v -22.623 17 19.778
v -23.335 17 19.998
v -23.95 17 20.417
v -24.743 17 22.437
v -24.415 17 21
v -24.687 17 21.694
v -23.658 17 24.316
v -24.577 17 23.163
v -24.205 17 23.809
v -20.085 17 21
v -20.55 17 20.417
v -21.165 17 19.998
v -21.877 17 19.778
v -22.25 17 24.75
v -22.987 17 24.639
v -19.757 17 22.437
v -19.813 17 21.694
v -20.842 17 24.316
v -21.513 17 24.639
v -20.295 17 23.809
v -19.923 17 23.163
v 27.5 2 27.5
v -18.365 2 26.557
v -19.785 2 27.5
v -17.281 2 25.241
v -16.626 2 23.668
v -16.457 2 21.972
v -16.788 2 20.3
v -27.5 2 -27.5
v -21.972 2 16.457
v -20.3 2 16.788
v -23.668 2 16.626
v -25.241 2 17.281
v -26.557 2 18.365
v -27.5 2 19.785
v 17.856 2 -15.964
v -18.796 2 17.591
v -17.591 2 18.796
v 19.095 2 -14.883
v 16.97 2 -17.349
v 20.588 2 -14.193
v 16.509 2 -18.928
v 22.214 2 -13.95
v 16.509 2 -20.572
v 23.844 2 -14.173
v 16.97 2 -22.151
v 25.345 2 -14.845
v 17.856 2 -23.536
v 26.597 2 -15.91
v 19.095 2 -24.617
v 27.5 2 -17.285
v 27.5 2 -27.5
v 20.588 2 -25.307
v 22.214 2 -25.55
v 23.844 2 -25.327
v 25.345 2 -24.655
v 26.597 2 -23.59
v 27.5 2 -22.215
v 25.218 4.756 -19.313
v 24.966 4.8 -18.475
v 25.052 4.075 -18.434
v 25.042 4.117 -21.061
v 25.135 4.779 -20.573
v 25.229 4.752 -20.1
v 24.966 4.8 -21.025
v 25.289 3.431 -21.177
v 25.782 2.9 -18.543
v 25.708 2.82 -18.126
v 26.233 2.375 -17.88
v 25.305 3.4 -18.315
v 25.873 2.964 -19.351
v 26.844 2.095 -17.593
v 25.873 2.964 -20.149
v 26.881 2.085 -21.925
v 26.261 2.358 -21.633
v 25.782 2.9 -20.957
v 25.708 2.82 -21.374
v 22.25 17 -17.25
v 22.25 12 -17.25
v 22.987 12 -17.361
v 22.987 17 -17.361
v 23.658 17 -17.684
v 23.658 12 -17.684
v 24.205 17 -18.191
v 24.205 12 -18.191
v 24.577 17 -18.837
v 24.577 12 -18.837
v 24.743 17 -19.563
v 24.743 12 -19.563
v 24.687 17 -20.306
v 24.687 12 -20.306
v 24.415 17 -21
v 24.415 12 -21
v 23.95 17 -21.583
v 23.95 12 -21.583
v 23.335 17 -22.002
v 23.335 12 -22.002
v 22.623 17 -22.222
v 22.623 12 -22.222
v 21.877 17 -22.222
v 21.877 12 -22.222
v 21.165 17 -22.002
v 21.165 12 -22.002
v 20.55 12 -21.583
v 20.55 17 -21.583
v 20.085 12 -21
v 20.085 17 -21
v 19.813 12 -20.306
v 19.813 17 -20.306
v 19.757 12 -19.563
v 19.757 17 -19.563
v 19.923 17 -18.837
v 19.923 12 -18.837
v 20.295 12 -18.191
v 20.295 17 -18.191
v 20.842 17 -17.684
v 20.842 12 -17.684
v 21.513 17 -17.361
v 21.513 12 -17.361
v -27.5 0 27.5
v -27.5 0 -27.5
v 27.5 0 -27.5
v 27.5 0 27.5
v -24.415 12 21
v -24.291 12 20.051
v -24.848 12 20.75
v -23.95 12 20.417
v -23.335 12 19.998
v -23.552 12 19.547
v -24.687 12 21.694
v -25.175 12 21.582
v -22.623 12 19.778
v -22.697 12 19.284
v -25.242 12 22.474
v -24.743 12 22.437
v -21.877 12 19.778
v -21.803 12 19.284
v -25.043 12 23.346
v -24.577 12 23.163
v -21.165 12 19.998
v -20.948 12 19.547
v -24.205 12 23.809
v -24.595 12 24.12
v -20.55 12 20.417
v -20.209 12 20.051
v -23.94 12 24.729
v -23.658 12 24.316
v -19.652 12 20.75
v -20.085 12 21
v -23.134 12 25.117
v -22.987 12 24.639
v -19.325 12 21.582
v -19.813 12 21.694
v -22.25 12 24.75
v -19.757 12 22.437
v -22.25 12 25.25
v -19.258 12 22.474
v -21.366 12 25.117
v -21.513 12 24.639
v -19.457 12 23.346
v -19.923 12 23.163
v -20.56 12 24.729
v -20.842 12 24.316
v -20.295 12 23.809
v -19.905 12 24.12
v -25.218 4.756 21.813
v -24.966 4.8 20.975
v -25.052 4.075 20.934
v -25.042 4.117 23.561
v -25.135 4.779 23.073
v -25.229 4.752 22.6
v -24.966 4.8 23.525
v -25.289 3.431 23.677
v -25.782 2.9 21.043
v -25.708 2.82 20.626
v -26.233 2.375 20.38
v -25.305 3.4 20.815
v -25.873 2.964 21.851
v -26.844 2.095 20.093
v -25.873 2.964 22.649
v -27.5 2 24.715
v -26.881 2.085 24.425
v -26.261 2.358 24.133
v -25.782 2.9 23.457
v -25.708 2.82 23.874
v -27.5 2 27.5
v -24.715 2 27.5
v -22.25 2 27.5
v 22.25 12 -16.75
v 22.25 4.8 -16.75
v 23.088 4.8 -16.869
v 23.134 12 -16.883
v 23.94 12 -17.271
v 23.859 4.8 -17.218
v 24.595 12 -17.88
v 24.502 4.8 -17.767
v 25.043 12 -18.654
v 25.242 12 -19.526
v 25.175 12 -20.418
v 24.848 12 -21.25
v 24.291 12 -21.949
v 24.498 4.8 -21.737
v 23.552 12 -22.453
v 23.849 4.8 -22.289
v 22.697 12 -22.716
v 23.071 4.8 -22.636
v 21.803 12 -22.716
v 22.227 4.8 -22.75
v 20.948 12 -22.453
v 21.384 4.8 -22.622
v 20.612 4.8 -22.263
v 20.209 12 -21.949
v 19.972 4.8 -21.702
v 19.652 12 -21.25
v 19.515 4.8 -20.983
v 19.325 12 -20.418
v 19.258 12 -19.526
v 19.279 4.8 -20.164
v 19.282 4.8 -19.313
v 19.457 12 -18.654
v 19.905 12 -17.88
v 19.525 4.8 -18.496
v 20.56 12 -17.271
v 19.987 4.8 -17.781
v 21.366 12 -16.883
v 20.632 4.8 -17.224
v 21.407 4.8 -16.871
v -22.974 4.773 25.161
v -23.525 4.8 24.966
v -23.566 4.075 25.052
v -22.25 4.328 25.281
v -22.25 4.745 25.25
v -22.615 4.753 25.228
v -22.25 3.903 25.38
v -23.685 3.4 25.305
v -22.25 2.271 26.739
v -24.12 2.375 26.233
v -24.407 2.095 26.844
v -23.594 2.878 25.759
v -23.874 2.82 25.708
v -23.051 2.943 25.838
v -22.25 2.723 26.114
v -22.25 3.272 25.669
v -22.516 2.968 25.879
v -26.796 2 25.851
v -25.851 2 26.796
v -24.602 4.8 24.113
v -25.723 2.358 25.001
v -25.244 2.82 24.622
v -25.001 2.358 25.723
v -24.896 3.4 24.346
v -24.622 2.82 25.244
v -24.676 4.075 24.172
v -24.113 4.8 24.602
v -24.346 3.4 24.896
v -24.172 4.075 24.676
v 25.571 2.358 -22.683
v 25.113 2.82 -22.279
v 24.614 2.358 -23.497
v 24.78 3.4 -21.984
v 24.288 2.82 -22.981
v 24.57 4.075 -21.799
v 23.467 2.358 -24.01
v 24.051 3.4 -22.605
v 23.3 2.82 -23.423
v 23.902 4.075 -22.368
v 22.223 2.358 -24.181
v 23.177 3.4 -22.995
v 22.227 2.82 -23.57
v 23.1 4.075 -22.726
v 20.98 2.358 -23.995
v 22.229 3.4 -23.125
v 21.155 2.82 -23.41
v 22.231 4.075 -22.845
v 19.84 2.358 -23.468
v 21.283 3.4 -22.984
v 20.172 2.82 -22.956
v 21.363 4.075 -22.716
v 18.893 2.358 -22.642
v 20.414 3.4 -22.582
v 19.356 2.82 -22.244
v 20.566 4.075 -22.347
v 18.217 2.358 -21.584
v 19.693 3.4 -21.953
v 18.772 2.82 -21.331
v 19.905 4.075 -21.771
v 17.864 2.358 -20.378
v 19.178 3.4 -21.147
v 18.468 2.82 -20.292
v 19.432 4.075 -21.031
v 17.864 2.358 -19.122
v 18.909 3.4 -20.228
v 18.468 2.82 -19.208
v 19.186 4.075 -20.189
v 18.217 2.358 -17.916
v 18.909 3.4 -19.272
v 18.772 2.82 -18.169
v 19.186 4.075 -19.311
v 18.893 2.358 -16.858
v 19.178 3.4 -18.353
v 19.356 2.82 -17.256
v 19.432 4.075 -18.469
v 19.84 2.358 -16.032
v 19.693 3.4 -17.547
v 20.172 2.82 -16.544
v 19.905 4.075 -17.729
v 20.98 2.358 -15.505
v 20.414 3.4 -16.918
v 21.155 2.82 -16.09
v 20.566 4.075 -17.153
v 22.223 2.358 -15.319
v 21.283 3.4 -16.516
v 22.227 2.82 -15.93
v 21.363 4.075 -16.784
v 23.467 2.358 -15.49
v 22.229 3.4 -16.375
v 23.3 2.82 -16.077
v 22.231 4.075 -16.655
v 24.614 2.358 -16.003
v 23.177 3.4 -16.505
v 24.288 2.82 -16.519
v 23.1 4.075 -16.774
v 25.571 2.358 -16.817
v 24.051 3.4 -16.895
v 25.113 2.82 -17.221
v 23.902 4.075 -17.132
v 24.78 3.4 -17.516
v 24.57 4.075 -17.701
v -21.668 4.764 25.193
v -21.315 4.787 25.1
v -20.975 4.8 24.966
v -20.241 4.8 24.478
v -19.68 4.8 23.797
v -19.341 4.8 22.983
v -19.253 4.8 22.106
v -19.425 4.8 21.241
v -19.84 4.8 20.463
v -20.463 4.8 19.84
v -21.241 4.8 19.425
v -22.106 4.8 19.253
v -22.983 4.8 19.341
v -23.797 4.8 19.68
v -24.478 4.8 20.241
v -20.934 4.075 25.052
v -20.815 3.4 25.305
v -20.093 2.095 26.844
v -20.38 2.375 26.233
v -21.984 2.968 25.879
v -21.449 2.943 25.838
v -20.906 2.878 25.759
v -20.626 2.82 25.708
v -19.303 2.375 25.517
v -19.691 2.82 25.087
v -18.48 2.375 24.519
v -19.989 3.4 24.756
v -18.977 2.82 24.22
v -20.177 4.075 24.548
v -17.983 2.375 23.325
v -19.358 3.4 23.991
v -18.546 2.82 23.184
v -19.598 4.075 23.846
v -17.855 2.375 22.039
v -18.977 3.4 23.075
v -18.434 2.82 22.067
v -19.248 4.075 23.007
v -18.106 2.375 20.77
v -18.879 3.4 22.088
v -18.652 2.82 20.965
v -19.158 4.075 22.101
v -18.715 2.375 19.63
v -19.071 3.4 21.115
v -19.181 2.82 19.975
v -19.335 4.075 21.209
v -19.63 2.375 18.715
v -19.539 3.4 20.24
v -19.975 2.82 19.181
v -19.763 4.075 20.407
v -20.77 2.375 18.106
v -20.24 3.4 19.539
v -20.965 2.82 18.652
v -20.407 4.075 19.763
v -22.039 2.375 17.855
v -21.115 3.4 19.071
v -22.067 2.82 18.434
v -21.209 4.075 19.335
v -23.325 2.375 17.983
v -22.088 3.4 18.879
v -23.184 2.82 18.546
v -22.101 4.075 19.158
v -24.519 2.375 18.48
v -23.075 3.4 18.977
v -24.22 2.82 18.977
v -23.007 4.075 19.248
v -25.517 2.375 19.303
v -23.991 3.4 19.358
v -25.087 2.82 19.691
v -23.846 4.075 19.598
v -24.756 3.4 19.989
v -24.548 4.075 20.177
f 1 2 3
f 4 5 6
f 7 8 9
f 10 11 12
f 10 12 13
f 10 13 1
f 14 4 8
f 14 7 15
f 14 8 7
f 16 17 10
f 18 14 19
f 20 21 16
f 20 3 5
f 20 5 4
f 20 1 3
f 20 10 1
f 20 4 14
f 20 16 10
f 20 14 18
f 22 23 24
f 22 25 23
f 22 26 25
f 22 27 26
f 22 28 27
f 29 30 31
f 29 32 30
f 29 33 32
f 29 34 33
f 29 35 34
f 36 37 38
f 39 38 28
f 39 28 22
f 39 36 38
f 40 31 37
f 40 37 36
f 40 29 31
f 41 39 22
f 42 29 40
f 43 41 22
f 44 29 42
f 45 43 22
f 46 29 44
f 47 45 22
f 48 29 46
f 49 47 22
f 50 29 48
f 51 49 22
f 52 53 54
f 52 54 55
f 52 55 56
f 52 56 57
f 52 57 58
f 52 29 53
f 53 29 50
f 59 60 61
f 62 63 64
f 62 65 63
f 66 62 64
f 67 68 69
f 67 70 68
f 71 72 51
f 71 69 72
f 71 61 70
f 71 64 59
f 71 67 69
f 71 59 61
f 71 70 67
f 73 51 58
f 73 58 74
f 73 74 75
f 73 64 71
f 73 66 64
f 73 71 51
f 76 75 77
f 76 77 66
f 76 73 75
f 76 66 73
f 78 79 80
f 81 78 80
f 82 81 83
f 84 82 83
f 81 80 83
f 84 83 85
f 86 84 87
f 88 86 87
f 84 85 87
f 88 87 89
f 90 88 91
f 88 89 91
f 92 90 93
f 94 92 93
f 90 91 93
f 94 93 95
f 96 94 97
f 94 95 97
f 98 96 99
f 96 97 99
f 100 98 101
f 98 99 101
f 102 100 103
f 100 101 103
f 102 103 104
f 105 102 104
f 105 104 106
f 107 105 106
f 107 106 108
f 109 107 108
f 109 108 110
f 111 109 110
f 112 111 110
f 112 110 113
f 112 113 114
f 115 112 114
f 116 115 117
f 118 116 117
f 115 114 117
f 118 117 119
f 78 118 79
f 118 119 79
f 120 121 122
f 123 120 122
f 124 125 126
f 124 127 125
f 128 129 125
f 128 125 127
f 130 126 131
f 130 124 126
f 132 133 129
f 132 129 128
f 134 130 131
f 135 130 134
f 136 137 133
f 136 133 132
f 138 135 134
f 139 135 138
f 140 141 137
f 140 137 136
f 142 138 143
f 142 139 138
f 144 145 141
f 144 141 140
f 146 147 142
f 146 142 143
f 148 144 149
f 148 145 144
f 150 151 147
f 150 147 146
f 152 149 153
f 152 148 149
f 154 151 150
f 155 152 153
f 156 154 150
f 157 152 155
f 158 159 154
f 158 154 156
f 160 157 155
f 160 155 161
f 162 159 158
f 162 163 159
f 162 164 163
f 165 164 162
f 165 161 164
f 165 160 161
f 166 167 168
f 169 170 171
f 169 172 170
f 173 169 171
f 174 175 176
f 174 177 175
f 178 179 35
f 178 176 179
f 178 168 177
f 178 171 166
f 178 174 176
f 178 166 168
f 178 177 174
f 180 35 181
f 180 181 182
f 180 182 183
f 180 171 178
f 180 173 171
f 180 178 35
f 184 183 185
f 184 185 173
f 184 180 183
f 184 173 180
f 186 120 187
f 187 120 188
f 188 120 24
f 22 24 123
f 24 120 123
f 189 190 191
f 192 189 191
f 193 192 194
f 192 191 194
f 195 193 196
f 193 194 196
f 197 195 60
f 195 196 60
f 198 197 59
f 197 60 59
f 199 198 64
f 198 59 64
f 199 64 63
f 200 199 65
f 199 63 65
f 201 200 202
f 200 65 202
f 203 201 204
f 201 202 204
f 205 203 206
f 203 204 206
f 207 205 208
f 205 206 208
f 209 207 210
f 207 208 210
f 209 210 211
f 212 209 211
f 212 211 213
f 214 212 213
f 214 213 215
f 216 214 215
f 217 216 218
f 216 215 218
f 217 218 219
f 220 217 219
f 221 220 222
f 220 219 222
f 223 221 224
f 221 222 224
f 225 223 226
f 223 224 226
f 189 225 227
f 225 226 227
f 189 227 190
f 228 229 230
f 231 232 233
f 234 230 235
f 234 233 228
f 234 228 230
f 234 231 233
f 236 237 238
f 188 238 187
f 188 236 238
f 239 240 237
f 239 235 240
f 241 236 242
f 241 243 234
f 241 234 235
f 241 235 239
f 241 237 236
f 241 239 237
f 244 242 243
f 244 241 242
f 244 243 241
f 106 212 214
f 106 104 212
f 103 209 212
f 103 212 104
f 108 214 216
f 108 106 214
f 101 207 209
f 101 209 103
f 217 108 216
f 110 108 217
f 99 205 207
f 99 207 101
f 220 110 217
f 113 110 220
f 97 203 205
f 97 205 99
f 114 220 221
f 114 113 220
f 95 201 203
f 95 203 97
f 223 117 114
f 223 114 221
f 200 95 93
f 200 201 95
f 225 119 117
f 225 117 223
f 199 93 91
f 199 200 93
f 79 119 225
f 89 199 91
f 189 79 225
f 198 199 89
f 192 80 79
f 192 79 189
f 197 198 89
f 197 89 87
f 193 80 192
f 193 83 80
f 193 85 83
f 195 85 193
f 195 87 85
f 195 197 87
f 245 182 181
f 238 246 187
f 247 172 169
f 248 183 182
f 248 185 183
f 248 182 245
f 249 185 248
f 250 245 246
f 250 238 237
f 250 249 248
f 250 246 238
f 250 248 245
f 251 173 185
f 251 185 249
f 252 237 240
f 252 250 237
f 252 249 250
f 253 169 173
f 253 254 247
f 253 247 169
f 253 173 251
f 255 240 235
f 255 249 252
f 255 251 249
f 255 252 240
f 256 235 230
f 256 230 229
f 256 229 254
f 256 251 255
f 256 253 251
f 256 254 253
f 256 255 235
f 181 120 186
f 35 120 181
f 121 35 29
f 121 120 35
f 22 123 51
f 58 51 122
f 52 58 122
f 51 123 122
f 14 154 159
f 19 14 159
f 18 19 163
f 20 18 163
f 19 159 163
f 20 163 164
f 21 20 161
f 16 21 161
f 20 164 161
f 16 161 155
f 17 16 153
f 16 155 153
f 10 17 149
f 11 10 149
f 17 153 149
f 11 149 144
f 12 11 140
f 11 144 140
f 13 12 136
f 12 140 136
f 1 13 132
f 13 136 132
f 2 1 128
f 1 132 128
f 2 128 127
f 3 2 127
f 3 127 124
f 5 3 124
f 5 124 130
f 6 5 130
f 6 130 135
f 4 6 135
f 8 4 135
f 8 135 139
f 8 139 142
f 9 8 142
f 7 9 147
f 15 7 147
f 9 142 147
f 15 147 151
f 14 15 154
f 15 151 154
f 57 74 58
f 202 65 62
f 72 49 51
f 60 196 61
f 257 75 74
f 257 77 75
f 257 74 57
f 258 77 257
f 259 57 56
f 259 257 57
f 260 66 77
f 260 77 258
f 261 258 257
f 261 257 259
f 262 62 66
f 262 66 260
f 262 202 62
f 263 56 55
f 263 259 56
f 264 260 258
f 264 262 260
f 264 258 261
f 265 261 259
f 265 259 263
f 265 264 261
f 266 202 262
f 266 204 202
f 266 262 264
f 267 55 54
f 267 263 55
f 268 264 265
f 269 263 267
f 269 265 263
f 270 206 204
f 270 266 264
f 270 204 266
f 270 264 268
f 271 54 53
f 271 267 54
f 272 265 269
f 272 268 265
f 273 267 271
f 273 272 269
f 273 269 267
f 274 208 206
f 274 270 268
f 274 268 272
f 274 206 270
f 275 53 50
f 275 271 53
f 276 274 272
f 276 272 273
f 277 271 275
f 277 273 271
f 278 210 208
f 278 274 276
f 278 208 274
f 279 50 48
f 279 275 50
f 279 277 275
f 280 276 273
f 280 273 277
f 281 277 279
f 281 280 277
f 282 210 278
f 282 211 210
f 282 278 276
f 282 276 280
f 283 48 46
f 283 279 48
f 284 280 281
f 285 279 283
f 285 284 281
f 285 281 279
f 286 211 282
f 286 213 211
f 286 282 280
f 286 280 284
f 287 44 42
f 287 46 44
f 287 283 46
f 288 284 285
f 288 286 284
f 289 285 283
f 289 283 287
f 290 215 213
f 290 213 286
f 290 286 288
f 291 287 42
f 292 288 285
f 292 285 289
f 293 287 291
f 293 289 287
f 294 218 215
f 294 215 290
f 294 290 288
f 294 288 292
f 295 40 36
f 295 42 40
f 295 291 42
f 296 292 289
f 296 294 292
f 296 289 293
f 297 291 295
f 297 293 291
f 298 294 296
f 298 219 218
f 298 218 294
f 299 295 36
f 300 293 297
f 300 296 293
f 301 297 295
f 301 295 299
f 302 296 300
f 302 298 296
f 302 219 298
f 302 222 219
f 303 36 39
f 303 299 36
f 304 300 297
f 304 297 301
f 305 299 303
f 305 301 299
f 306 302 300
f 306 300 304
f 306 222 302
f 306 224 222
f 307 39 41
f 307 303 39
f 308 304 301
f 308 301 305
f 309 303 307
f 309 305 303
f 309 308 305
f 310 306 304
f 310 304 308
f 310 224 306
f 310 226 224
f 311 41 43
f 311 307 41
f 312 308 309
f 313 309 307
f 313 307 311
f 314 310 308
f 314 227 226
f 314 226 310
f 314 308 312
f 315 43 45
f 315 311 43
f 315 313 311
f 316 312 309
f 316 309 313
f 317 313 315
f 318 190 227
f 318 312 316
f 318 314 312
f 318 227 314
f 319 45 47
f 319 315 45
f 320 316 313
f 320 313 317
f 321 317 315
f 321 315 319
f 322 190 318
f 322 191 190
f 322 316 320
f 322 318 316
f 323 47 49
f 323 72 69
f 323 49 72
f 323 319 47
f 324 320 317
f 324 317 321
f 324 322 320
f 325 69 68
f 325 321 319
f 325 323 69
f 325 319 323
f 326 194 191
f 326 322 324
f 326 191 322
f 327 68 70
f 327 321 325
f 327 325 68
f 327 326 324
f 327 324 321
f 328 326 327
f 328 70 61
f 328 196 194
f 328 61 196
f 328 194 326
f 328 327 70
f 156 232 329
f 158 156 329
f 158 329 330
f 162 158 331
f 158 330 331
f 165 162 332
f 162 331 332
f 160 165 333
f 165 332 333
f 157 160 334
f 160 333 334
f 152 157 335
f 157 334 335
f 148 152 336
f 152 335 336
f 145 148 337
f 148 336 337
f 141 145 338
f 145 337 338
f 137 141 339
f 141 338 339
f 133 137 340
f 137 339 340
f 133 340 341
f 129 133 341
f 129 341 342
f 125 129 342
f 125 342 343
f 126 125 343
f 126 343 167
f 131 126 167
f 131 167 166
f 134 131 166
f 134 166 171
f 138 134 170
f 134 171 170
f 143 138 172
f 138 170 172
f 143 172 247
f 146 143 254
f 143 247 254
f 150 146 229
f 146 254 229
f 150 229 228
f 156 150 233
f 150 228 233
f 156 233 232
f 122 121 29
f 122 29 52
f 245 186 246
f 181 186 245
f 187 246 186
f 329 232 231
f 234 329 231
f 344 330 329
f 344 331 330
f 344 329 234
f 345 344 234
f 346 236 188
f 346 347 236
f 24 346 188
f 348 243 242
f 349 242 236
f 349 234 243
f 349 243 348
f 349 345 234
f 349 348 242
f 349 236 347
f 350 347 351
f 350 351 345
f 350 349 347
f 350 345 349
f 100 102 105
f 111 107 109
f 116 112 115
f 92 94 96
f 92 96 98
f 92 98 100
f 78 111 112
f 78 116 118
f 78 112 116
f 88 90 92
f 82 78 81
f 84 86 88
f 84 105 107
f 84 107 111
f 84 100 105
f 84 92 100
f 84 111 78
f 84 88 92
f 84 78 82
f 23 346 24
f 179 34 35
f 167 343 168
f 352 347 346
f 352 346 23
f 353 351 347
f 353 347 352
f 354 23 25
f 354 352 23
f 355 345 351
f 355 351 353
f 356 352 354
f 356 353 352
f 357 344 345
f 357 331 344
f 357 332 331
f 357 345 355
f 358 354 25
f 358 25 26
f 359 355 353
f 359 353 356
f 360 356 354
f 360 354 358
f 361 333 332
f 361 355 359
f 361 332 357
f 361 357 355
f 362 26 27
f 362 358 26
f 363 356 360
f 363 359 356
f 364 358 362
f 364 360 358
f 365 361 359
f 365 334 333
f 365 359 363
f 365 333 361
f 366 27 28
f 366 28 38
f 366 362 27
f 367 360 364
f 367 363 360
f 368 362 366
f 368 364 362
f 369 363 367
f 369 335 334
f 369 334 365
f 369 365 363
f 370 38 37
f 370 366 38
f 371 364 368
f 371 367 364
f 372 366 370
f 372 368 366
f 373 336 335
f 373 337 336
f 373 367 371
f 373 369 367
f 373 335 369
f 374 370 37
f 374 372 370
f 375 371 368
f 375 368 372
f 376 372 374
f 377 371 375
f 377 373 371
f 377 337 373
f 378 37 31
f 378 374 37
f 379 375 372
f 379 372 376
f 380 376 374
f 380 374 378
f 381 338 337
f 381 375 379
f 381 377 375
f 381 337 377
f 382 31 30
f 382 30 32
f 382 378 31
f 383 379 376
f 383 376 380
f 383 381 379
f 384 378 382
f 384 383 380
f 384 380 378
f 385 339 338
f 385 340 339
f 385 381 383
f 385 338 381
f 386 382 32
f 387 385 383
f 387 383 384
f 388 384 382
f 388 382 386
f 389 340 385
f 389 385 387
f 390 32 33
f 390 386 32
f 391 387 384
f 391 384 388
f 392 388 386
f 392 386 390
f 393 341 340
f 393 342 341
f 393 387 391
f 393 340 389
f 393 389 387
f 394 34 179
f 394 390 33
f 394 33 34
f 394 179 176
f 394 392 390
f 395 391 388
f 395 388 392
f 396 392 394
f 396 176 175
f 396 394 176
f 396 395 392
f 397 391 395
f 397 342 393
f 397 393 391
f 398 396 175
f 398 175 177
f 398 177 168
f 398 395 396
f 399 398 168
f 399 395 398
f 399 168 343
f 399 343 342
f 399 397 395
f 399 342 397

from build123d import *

# Parameters (mm, degrees)
SKETCH1_W           = 55
SKETCH1_H           = 55
BOSS_EXTRUDE1_DEPTH = 2
SKETCH2_R           = 3
BOSS_EXTRUDE2_DEPTH = 10
FILLET1_R           = 2.8
SKETCH3_R           = 2.5
BOSS_EXTRUDE3_DEPTH = 5


with BuildPart() as part:
    # Sketch1 → Boss-Extrude1 (new body)
    with BuildSketch(Plane(origin=(0, 0, 0), x_dir=(1, 0, 0), z_dir=(0, 1, 0))):
        Rectangle(SKETCH1_W, SKETCH1_H)
    extrude(amount=BOSS_EXTRUDE1_DEPTH)

    # Sketch2 → Boss-Extrude2 (add)
    with BuildSketch(Plane(origin=(0, 2, 0), x_dir=(1, 0, 0), z_dir=(0, 1, 0))):
        with Locations(Location((-22.25, -22.25, 0), (0, 0, 270))):
            Circle(SKETCH2_R)
        with Locations(Location((22.25, 19.75, 0), (0, 0, 270))):
            Circle(SKETCH2_R)
    extrude(amount=BOSS_EXTRUDE2_DEPTH)

    # Fillet1
    fillet1_edges = [part.edges().sort_by_distance(p)[0] for p in [
        (-22.25, 2, 19.25),
        (22.25, 2, -22.75),
    ]]
    fillet(fillet1_edges, radius=FILLET1_R)

    # Sketch3 → Boss-Extrude3 (add)
    with BuildSketch(Plane(origin=(0, 12, 0), x_dir=(1, 0, 0), z_dir=(0, 1, 0))):
        with Locations(Location((-22.25, -22.25, 0), (0, 0, 270))):
            Circle(SKETCH3_R)
        with Locations(Location((22.25, 19.75, 0), (0, 0, 270))):
            Circle(SKETCH3_R)
    extrude(amount=BOSS_EXTRUDE3_DEPTH)


solid = part.part
